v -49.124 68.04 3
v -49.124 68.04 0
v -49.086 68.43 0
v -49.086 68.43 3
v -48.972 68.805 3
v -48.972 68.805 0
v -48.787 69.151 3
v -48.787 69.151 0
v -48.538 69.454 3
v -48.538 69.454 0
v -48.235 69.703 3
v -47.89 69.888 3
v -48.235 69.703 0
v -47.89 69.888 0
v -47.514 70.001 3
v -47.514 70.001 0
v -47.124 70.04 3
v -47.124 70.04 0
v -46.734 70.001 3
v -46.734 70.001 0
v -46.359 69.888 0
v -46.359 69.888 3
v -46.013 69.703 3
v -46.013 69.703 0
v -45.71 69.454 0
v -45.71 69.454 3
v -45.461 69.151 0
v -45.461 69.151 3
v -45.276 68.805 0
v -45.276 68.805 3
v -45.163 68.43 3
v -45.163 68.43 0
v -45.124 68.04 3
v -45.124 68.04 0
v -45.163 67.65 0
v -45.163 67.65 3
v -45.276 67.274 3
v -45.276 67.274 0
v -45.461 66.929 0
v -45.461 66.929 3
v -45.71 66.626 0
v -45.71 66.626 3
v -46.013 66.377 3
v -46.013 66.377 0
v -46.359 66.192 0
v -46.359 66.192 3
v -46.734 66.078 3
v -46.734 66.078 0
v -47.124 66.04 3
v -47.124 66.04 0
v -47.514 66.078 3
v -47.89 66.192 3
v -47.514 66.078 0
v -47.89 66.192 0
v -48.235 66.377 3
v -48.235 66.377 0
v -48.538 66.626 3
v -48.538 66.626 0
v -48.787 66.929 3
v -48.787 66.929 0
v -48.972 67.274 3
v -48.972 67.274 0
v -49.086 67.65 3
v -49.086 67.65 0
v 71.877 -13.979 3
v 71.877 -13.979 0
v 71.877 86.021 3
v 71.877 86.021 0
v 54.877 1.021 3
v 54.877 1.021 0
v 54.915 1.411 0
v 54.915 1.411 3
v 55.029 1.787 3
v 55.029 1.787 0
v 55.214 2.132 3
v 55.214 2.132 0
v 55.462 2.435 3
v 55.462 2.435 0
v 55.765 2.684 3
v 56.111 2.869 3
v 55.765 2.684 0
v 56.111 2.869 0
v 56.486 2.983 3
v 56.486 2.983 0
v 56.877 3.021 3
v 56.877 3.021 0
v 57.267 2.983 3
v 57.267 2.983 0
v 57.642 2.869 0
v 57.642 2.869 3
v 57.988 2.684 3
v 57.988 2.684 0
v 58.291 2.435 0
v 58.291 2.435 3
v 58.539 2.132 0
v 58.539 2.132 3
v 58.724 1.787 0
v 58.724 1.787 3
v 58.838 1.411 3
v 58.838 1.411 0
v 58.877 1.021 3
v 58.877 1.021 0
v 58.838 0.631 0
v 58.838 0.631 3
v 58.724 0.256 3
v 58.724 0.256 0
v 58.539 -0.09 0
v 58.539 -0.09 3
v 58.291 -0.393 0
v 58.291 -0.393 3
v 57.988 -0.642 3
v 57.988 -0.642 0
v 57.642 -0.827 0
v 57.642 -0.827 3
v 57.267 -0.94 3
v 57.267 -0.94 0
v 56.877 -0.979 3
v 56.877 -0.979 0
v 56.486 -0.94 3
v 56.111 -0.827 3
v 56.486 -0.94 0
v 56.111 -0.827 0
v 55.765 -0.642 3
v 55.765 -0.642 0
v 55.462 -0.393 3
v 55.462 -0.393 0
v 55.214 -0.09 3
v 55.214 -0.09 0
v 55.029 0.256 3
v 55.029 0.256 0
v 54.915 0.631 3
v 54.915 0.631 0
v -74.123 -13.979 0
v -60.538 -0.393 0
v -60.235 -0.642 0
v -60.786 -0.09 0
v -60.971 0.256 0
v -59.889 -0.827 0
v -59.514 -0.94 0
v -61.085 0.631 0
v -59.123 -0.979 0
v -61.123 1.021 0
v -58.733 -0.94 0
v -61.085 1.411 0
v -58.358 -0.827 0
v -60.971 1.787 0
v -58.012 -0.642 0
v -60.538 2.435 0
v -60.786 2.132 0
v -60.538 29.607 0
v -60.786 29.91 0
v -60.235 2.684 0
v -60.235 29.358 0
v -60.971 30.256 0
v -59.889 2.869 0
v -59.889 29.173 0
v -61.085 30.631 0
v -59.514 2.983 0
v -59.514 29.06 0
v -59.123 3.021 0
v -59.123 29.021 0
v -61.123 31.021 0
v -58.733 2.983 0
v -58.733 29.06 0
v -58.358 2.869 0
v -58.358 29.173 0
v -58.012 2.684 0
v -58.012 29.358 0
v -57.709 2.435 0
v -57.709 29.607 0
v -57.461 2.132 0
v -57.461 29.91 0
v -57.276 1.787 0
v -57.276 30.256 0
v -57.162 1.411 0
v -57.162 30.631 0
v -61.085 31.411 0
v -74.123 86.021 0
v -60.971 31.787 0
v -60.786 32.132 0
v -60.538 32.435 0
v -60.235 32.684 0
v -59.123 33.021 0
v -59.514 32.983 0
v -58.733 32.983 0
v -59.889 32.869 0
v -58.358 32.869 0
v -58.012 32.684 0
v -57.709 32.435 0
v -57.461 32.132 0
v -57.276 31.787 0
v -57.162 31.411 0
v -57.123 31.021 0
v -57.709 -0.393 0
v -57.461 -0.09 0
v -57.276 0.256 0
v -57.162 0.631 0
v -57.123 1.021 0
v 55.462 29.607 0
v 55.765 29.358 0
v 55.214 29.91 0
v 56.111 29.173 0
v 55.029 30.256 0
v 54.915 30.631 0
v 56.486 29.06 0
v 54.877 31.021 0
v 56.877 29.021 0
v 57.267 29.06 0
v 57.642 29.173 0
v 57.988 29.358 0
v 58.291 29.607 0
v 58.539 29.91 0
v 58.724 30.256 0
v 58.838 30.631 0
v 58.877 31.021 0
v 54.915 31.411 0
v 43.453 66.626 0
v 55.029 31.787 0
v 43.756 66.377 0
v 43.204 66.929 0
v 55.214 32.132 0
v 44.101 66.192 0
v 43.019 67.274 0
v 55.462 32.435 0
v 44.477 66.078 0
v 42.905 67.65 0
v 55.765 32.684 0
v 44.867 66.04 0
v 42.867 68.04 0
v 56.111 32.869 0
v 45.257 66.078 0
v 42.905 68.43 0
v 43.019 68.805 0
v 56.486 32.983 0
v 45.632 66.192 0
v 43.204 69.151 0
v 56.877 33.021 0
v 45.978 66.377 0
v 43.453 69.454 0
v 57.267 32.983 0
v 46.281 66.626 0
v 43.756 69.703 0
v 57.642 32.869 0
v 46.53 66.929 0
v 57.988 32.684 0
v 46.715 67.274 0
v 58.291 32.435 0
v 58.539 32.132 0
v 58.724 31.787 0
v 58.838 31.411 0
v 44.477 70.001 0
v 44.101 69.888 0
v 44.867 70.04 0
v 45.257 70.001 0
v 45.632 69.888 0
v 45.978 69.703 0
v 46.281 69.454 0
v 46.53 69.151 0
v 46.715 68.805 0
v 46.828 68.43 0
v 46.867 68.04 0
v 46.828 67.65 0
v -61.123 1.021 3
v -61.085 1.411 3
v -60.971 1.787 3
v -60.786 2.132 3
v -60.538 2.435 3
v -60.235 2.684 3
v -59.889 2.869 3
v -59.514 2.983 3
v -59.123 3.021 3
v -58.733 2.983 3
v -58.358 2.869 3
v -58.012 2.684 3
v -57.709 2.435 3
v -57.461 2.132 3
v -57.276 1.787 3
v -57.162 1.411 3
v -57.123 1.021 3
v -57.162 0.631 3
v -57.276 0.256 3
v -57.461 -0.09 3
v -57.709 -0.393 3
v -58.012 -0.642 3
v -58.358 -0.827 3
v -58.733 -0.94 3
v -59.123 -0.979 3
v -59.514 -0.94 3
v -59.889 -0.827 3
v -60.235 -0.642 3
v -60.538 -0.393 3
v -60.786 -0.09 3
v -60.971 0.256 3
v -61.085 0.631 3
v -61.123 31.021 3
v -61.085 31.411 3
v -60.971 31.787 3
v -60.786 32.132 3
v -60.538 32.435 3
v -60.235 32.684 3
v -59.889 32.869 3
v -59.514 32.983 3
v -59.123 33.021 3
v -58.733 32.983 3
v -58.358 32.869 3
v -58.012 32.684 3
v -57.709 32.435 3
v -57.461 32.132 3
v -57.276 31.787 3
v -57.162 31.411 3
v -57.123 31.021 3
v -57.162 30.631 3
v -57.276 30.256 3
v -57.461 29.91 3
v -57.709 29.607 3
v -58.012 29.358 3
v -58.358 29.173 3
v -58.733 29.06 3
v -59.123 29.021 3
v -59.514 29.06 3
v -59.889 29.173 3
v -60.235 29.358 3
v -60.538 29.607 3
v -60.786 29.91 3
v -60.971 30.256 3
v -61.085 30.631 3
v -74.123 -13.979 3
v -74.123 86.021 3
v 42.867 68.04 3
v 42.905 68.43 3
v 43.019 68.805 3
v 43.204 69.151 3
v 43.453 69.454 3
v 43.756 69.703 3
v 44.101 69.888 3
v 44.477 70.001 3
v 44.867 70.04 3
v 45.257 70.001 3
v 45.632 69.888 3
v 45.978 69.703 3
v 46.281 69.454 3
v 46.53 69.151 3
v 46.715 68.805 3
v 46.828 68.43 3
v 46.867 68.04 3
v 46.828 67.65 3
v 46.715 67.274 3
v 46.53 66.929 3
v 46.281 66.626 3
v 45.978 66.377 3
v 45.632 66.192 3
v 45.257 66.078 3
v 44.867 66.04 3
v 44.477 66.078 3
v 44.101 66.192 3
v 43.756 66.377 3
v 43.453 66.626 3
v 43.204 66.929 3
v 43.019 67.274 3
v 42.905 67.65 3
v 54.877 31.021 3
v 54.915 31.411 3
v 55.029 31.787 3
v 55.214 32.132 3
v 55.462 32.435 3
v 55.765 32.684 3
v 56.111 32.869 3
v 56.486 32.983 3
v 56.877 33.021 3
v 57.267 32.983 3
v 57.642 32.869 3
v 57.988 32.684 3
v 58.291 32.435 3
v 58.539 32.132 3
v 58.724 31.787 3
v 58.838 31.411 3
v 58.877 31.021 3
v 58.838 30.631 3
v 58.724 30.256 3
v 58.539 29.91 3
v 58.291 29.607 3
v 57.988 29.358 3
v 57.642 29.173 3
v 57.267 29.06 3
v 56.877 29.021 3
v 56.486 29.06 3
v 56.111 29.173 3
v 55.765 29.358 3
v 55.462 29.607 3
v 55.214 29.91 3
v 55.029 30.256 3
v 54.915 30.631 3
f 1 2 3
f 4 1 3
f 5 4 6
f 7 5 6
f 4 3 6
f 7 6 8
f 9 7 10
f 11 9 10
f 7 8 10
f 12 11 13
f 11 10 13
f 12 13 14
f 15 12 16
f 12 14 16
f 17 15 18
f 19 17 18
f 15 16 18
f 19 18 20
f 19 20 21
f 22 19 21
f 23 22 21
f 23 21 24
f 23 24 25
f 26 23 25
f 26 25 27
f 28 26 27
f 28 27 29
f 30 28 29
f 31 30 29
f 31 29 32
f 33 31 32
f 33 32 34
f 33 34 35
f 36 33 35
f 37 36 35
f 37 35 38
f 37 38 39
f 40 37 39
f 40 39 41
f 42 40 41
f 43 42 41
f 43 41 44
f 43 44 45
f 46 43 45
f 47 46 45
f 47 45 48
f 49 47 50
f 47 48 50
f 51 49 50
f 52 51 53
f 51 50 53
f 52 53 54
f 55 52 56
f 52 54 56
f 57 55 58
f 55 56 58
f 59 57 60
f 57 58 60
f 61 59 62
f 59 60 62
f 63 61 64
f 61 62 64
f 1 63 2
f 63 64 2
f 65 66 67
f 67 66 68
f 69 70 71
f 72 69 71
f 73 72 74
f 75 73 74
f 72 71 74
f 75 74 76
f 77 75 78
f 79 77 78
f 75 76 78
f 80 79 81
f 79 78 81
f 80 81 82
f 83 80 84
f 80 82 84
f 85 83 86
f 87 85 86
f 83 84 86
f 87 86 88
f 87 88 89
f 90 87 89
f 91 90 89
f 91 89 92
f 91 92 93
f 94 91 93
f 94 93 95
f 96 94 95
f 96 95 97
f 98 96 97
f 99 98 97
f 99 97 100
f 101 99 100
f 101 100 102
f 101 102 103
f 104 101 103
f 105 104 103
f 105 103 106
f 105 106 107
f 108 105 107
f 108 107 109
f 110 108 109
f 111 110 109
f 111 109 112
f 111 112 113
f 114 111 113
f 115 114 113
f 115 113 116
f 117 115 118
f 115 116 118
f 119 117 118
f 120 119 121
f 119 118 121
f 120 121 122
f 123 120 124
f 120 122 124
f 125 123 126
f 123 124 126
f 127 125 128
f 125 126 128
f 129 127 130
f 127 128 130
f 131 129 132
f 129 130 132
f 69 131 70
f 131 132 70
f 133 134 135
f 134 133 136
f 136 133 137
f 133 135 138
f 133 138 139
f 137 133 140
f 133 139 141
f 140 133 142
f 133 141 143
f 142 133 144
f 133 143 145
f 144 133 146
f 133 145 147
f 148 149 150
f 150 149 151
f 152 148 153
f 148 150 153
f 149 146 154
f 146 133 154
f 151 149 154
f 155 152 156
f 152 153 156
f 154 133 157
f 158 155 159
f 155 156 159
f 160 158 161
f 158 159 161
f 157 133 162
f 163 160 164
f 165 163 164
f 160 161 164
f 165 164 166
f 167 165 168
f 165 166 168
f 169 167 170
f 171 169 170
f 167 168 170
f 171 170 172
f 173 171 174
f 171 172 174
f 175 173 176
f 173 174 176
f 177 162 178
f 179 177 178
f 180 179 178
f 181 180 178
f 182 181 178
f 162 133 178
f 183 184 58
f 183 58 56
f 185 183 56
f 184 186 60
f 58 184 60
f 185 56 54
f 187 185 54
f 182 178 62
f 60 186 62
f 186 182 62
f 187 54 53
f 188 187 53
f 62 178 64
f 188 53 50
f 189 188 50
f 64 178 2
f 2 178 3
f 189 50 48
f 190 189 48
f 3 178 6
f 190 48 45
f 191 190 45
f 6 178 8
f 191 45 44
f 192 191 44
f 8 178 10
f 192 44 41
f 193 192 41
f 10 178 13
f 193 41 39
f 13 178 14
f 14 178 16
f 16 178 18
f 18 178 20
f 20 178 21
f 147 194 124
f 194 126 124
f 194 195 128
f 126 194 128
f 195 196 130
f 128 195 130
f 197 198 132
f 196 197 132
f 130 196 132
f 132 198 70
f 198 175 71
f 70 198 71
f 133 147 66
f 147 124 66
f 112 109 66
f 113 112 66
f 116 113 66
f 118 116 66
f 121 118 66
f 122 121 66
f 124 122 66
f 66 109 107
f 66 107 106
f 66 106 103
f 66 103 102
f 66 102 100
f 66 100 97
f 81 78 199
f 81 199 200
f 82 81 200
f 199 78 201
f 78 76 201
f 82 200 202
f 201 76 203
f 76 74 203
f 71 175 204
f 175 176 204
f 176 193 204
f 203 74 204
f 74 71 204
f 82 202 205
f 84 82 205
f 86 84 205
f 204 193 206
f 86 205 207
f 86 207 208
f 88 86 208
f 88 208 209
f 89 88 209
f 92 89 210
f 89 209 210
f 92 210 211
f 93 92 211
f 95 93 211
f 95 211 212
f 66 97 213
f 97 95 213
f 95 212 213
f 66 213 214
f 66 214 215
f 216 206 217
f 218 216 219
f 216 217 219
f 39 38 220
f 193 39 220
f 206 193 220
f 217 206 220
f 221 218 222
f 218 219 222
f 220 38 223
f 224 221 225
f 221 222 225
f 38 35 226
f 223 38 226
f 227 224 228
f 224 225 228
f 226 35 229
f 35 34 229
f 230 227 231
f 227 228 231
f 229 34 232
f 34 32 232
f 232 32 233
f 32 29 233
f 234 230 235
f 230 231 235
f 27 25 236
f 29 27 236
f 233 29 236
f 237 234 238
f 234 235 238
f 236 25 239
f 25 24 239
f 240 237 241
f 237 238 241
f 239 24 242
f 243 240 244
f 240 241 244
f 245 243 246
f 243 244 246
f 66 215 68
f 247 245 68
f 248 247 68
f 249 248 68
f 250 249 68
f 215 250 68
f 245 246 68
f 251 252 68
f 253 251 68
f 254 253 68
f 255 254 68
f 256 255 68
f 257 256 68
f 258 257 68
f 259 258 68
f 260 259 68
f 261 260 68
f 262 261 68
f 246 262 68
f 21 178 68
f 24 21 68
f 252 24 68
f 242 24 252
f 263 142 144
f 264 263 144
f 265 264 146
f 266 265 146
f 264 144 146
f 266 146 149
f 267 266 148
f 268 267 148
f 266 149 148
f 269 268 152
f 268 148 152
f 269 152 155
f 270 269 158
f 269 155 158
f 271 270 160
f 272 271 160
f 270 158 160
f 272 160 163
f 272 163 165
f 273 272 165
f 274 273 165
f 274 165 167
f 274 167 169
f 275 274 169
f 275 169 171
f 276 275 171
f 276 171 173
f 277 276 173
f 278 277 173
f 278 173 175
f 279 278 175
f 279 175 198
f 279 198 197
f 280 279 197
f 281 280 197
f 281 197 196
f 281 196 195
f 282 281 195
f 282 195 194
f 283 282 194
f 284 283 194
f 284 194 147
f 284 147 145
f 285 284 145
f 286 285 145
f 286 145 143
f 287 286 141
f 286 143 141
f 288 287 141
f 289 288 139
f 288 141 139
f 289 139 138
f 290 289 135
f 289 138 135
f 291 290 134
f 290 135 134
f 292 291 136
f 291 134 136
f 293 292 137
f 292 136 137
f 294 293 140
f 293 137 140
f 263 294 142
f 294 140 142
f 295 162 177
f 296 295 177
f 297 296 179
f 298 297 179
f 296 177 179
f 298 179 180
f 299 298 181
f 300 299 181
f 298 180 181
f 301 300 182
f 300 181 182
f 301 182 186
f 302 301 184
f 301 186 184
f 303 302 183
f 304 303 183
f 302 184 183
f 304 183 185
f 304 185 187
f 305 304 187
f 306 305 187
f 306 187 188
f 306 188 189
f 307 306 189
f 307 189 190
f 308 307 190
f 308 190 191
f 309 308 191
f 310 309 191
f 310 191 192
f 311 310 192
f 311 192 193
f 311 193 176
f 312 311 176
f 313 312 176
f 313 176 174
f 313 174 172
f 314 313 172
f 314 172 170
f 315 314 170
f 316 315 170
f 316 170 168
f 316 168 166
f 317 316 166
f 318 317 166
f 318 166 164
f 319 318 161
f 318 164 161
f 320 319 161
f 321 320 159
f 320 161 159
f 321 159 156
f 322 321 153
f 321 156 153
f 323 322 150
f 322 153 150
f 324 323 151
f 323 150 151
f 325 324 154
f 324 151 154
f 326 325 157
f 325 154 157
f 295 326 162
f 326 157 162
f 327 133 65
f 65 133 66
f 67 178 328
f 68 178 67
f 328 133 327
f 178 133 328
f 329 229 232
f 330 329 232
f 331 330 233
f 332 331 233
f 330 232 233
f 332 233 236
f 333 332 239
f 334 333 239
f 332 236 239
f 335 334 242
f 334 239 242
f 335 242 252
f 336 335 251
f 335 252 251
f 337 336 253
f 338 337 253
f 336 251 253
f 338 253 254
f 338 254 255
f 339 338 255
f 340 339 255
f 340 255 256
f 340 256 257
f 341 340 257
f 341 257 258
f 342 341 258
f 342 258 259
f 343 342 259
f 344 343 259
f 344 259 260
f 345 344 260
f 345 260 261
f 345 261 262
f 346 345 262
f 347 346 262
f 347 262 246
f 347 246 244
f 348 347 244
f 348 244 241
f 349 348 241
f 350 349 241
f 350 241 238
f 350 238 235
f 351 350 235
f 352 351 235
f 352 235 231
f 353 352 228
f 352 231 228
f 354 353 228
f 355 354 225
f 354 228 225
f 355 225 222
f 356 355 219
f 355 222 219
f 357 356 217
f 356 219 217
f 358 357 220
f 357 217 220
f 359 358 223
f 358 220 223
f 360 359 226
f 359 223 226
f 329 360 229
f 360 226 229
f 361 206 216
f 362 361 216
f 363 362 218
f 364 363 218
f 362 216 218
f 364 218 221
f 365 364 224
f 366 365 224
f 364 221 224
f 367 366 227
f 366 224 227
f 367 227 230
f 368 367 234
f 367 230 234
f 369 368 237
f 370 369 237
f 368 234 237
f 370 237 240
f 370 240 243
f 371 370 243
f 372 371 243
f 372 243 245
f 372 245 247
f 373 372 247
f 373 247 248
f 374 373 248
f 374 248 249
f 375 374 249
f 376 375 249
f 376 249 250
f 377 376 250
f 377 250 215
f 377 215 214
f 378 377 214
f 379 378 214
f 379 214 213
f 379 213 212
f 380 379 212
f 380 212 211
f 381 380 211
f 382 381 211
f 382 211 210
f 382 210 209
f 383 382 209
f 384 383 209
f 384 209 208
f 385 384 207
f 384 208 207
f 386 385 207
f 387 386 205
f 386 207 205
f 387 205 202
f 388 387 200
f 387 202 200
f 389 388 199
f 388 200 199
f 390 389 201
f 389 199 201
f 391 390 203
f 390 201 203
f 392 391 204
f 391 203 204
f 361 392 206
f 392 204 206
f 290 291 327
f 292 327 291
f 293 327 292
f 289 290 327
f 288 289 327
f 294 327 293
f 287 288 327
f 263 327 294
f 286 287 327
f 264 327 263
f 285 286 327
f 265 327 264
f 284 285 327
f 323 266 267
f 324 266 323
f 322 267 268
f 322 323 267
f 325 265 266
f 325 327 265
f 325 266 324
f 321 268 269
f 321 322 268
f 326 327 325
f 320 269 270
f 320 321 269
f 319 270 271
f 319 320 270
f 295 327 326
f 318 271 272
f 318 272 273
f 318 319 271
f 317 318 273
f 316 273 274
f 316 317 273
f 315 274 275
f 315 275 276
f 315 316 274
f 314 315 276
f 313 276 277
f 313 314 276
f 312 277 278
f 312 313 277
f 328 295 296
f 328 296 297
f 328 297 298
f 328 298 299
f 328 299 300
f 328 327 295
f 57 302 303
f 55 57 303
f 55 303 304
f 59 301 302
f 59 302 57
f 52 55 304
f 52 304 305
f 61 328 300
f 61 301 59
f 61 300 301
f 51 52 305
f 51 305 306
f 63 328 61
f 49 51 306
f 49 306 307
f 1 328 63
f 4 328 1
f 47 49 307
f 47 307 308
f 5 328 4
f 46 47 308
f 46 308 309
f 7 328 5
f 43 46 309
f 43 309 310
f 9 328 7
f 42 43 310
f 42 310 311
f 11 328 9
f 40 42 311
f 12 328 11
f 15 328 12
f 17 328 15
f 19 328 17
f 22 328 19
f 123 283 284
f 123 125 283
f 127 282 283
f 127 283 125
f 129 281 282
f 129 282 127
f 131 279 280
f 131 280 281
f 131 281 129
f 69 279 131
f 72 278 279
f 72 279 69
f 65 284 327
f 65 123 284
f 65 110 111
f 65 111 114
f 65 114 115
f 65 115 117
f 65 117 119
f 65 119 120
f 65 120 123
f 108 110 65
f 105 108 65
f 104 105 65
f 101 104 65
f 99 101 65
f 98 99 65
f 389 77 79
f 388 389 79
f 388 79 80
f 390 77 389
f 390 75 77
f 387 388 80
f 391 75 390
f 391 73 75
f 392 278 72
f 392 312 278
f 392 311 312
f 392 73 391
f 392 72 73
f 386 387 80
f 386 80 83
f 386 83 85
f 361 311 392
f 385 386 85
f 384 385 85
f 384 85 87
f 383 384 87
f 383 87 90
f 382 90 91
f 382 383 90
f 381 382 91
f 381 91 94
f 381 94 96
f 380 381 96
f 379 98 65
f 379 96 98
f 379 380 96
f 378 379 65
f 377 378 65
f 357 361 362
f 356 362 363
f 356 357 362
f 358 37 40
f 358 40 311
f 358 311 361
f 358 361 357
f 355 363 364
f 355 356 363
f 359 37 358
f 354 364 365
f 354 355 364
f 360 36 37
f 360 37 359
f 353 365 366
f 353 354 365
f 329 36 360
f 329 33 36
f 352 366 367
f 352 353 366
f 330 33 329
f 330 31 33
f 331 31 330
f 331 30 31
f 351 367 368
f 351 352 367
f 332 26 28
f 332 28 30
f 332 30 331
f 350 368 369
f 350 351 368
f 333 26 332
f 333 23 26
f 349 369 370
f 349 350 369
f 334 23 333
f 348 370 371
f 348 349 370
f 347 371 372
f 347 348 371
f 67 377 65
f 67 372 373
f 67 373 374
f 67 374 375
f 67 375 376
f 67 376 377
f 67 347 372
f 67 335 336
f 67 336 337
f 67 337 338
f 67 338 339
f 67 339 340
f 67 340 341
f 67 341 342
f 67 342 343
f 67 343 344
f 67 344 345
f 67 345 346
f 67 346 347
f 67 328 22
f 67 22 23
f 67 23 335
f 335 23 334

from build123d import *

# Parameters (mm, degrees)
SKETCH1_W           = 146
SKETCH1_H           = 100
BOSS_EXTRUDE1_DEPTH = 3
SKETCH2_R           = 2
CUT_EXTRUDE1_DEPTH  = 4
SKETCH3_R           = 2
CUT_EXTRUDE2_DEPTH  = 4
SKETCH4_R           = 2
CUT_EXTRUDE3_DEPTH  = 4


with BuildPart() as part:
    # Sketch1 → Boss-Extrude1 (new body)
    with BuildSketch(Plane.XY):
        with Locations((-1.123462833, 36.021174275)):
            Rectangle(SKETCH1_W, SKETCH1_H)
    extrude(amount=BOSS_EXTRUDE1_DEPTH)

    # Sketch2 → Cut-Extrude1 (cut, through all)
    with BuildSketch(Plane(origin=(0, 0, 0), x_dir=(-1, 0, 0), z_dir=(0, 0, -1))):
        with Locations((59.123462833, 1.021174275)):
            Circle(SKETCH2_R)
        with Locations((-56.876537167, 1.021174275)):
            Circle(SKETCH2_R)
    extrude(amount=-CUT_EXTRUDE1_DEPTH, mode=Mode.SUBTRACT)

    # Sketch3 → Cut-Extrude2 (cut, through all)
    with BuildSketch(Plane(origin=(0, 0, 0), x_dir=(-1, 0, 0), z_dir=(0, 0, -1))):
        with Locations((-56.876537167, 31.021174275)):
            Circle(SKETCH3_R)
        with Locations((59.123462833, 31.021174275)):
            Circle(SKETCH3_R)
    extrude(amount=-CUT_EXTRUDE2_DEPTH, mode=Mode.SUBTRACT)

    # Sketch4 → Cut-Extrude3 (cut, through all)
    with BuildSketch(Plane(origin=(0, 0, 0), x_dir=(-1, 0, 0), z_dir=(0, 0, -1))):
        with Locations((-44.866828557, 68.039856286)):
            Circle(SKETCH4_R)
        with Locations((47.124228631, 68.039856286)):
            Circle(SKETCH4_R)
    extrude(amount=-CUT_EXTRUDE3_DEPTH, mode=Mode.SUBTRACT)


solid = part.part
